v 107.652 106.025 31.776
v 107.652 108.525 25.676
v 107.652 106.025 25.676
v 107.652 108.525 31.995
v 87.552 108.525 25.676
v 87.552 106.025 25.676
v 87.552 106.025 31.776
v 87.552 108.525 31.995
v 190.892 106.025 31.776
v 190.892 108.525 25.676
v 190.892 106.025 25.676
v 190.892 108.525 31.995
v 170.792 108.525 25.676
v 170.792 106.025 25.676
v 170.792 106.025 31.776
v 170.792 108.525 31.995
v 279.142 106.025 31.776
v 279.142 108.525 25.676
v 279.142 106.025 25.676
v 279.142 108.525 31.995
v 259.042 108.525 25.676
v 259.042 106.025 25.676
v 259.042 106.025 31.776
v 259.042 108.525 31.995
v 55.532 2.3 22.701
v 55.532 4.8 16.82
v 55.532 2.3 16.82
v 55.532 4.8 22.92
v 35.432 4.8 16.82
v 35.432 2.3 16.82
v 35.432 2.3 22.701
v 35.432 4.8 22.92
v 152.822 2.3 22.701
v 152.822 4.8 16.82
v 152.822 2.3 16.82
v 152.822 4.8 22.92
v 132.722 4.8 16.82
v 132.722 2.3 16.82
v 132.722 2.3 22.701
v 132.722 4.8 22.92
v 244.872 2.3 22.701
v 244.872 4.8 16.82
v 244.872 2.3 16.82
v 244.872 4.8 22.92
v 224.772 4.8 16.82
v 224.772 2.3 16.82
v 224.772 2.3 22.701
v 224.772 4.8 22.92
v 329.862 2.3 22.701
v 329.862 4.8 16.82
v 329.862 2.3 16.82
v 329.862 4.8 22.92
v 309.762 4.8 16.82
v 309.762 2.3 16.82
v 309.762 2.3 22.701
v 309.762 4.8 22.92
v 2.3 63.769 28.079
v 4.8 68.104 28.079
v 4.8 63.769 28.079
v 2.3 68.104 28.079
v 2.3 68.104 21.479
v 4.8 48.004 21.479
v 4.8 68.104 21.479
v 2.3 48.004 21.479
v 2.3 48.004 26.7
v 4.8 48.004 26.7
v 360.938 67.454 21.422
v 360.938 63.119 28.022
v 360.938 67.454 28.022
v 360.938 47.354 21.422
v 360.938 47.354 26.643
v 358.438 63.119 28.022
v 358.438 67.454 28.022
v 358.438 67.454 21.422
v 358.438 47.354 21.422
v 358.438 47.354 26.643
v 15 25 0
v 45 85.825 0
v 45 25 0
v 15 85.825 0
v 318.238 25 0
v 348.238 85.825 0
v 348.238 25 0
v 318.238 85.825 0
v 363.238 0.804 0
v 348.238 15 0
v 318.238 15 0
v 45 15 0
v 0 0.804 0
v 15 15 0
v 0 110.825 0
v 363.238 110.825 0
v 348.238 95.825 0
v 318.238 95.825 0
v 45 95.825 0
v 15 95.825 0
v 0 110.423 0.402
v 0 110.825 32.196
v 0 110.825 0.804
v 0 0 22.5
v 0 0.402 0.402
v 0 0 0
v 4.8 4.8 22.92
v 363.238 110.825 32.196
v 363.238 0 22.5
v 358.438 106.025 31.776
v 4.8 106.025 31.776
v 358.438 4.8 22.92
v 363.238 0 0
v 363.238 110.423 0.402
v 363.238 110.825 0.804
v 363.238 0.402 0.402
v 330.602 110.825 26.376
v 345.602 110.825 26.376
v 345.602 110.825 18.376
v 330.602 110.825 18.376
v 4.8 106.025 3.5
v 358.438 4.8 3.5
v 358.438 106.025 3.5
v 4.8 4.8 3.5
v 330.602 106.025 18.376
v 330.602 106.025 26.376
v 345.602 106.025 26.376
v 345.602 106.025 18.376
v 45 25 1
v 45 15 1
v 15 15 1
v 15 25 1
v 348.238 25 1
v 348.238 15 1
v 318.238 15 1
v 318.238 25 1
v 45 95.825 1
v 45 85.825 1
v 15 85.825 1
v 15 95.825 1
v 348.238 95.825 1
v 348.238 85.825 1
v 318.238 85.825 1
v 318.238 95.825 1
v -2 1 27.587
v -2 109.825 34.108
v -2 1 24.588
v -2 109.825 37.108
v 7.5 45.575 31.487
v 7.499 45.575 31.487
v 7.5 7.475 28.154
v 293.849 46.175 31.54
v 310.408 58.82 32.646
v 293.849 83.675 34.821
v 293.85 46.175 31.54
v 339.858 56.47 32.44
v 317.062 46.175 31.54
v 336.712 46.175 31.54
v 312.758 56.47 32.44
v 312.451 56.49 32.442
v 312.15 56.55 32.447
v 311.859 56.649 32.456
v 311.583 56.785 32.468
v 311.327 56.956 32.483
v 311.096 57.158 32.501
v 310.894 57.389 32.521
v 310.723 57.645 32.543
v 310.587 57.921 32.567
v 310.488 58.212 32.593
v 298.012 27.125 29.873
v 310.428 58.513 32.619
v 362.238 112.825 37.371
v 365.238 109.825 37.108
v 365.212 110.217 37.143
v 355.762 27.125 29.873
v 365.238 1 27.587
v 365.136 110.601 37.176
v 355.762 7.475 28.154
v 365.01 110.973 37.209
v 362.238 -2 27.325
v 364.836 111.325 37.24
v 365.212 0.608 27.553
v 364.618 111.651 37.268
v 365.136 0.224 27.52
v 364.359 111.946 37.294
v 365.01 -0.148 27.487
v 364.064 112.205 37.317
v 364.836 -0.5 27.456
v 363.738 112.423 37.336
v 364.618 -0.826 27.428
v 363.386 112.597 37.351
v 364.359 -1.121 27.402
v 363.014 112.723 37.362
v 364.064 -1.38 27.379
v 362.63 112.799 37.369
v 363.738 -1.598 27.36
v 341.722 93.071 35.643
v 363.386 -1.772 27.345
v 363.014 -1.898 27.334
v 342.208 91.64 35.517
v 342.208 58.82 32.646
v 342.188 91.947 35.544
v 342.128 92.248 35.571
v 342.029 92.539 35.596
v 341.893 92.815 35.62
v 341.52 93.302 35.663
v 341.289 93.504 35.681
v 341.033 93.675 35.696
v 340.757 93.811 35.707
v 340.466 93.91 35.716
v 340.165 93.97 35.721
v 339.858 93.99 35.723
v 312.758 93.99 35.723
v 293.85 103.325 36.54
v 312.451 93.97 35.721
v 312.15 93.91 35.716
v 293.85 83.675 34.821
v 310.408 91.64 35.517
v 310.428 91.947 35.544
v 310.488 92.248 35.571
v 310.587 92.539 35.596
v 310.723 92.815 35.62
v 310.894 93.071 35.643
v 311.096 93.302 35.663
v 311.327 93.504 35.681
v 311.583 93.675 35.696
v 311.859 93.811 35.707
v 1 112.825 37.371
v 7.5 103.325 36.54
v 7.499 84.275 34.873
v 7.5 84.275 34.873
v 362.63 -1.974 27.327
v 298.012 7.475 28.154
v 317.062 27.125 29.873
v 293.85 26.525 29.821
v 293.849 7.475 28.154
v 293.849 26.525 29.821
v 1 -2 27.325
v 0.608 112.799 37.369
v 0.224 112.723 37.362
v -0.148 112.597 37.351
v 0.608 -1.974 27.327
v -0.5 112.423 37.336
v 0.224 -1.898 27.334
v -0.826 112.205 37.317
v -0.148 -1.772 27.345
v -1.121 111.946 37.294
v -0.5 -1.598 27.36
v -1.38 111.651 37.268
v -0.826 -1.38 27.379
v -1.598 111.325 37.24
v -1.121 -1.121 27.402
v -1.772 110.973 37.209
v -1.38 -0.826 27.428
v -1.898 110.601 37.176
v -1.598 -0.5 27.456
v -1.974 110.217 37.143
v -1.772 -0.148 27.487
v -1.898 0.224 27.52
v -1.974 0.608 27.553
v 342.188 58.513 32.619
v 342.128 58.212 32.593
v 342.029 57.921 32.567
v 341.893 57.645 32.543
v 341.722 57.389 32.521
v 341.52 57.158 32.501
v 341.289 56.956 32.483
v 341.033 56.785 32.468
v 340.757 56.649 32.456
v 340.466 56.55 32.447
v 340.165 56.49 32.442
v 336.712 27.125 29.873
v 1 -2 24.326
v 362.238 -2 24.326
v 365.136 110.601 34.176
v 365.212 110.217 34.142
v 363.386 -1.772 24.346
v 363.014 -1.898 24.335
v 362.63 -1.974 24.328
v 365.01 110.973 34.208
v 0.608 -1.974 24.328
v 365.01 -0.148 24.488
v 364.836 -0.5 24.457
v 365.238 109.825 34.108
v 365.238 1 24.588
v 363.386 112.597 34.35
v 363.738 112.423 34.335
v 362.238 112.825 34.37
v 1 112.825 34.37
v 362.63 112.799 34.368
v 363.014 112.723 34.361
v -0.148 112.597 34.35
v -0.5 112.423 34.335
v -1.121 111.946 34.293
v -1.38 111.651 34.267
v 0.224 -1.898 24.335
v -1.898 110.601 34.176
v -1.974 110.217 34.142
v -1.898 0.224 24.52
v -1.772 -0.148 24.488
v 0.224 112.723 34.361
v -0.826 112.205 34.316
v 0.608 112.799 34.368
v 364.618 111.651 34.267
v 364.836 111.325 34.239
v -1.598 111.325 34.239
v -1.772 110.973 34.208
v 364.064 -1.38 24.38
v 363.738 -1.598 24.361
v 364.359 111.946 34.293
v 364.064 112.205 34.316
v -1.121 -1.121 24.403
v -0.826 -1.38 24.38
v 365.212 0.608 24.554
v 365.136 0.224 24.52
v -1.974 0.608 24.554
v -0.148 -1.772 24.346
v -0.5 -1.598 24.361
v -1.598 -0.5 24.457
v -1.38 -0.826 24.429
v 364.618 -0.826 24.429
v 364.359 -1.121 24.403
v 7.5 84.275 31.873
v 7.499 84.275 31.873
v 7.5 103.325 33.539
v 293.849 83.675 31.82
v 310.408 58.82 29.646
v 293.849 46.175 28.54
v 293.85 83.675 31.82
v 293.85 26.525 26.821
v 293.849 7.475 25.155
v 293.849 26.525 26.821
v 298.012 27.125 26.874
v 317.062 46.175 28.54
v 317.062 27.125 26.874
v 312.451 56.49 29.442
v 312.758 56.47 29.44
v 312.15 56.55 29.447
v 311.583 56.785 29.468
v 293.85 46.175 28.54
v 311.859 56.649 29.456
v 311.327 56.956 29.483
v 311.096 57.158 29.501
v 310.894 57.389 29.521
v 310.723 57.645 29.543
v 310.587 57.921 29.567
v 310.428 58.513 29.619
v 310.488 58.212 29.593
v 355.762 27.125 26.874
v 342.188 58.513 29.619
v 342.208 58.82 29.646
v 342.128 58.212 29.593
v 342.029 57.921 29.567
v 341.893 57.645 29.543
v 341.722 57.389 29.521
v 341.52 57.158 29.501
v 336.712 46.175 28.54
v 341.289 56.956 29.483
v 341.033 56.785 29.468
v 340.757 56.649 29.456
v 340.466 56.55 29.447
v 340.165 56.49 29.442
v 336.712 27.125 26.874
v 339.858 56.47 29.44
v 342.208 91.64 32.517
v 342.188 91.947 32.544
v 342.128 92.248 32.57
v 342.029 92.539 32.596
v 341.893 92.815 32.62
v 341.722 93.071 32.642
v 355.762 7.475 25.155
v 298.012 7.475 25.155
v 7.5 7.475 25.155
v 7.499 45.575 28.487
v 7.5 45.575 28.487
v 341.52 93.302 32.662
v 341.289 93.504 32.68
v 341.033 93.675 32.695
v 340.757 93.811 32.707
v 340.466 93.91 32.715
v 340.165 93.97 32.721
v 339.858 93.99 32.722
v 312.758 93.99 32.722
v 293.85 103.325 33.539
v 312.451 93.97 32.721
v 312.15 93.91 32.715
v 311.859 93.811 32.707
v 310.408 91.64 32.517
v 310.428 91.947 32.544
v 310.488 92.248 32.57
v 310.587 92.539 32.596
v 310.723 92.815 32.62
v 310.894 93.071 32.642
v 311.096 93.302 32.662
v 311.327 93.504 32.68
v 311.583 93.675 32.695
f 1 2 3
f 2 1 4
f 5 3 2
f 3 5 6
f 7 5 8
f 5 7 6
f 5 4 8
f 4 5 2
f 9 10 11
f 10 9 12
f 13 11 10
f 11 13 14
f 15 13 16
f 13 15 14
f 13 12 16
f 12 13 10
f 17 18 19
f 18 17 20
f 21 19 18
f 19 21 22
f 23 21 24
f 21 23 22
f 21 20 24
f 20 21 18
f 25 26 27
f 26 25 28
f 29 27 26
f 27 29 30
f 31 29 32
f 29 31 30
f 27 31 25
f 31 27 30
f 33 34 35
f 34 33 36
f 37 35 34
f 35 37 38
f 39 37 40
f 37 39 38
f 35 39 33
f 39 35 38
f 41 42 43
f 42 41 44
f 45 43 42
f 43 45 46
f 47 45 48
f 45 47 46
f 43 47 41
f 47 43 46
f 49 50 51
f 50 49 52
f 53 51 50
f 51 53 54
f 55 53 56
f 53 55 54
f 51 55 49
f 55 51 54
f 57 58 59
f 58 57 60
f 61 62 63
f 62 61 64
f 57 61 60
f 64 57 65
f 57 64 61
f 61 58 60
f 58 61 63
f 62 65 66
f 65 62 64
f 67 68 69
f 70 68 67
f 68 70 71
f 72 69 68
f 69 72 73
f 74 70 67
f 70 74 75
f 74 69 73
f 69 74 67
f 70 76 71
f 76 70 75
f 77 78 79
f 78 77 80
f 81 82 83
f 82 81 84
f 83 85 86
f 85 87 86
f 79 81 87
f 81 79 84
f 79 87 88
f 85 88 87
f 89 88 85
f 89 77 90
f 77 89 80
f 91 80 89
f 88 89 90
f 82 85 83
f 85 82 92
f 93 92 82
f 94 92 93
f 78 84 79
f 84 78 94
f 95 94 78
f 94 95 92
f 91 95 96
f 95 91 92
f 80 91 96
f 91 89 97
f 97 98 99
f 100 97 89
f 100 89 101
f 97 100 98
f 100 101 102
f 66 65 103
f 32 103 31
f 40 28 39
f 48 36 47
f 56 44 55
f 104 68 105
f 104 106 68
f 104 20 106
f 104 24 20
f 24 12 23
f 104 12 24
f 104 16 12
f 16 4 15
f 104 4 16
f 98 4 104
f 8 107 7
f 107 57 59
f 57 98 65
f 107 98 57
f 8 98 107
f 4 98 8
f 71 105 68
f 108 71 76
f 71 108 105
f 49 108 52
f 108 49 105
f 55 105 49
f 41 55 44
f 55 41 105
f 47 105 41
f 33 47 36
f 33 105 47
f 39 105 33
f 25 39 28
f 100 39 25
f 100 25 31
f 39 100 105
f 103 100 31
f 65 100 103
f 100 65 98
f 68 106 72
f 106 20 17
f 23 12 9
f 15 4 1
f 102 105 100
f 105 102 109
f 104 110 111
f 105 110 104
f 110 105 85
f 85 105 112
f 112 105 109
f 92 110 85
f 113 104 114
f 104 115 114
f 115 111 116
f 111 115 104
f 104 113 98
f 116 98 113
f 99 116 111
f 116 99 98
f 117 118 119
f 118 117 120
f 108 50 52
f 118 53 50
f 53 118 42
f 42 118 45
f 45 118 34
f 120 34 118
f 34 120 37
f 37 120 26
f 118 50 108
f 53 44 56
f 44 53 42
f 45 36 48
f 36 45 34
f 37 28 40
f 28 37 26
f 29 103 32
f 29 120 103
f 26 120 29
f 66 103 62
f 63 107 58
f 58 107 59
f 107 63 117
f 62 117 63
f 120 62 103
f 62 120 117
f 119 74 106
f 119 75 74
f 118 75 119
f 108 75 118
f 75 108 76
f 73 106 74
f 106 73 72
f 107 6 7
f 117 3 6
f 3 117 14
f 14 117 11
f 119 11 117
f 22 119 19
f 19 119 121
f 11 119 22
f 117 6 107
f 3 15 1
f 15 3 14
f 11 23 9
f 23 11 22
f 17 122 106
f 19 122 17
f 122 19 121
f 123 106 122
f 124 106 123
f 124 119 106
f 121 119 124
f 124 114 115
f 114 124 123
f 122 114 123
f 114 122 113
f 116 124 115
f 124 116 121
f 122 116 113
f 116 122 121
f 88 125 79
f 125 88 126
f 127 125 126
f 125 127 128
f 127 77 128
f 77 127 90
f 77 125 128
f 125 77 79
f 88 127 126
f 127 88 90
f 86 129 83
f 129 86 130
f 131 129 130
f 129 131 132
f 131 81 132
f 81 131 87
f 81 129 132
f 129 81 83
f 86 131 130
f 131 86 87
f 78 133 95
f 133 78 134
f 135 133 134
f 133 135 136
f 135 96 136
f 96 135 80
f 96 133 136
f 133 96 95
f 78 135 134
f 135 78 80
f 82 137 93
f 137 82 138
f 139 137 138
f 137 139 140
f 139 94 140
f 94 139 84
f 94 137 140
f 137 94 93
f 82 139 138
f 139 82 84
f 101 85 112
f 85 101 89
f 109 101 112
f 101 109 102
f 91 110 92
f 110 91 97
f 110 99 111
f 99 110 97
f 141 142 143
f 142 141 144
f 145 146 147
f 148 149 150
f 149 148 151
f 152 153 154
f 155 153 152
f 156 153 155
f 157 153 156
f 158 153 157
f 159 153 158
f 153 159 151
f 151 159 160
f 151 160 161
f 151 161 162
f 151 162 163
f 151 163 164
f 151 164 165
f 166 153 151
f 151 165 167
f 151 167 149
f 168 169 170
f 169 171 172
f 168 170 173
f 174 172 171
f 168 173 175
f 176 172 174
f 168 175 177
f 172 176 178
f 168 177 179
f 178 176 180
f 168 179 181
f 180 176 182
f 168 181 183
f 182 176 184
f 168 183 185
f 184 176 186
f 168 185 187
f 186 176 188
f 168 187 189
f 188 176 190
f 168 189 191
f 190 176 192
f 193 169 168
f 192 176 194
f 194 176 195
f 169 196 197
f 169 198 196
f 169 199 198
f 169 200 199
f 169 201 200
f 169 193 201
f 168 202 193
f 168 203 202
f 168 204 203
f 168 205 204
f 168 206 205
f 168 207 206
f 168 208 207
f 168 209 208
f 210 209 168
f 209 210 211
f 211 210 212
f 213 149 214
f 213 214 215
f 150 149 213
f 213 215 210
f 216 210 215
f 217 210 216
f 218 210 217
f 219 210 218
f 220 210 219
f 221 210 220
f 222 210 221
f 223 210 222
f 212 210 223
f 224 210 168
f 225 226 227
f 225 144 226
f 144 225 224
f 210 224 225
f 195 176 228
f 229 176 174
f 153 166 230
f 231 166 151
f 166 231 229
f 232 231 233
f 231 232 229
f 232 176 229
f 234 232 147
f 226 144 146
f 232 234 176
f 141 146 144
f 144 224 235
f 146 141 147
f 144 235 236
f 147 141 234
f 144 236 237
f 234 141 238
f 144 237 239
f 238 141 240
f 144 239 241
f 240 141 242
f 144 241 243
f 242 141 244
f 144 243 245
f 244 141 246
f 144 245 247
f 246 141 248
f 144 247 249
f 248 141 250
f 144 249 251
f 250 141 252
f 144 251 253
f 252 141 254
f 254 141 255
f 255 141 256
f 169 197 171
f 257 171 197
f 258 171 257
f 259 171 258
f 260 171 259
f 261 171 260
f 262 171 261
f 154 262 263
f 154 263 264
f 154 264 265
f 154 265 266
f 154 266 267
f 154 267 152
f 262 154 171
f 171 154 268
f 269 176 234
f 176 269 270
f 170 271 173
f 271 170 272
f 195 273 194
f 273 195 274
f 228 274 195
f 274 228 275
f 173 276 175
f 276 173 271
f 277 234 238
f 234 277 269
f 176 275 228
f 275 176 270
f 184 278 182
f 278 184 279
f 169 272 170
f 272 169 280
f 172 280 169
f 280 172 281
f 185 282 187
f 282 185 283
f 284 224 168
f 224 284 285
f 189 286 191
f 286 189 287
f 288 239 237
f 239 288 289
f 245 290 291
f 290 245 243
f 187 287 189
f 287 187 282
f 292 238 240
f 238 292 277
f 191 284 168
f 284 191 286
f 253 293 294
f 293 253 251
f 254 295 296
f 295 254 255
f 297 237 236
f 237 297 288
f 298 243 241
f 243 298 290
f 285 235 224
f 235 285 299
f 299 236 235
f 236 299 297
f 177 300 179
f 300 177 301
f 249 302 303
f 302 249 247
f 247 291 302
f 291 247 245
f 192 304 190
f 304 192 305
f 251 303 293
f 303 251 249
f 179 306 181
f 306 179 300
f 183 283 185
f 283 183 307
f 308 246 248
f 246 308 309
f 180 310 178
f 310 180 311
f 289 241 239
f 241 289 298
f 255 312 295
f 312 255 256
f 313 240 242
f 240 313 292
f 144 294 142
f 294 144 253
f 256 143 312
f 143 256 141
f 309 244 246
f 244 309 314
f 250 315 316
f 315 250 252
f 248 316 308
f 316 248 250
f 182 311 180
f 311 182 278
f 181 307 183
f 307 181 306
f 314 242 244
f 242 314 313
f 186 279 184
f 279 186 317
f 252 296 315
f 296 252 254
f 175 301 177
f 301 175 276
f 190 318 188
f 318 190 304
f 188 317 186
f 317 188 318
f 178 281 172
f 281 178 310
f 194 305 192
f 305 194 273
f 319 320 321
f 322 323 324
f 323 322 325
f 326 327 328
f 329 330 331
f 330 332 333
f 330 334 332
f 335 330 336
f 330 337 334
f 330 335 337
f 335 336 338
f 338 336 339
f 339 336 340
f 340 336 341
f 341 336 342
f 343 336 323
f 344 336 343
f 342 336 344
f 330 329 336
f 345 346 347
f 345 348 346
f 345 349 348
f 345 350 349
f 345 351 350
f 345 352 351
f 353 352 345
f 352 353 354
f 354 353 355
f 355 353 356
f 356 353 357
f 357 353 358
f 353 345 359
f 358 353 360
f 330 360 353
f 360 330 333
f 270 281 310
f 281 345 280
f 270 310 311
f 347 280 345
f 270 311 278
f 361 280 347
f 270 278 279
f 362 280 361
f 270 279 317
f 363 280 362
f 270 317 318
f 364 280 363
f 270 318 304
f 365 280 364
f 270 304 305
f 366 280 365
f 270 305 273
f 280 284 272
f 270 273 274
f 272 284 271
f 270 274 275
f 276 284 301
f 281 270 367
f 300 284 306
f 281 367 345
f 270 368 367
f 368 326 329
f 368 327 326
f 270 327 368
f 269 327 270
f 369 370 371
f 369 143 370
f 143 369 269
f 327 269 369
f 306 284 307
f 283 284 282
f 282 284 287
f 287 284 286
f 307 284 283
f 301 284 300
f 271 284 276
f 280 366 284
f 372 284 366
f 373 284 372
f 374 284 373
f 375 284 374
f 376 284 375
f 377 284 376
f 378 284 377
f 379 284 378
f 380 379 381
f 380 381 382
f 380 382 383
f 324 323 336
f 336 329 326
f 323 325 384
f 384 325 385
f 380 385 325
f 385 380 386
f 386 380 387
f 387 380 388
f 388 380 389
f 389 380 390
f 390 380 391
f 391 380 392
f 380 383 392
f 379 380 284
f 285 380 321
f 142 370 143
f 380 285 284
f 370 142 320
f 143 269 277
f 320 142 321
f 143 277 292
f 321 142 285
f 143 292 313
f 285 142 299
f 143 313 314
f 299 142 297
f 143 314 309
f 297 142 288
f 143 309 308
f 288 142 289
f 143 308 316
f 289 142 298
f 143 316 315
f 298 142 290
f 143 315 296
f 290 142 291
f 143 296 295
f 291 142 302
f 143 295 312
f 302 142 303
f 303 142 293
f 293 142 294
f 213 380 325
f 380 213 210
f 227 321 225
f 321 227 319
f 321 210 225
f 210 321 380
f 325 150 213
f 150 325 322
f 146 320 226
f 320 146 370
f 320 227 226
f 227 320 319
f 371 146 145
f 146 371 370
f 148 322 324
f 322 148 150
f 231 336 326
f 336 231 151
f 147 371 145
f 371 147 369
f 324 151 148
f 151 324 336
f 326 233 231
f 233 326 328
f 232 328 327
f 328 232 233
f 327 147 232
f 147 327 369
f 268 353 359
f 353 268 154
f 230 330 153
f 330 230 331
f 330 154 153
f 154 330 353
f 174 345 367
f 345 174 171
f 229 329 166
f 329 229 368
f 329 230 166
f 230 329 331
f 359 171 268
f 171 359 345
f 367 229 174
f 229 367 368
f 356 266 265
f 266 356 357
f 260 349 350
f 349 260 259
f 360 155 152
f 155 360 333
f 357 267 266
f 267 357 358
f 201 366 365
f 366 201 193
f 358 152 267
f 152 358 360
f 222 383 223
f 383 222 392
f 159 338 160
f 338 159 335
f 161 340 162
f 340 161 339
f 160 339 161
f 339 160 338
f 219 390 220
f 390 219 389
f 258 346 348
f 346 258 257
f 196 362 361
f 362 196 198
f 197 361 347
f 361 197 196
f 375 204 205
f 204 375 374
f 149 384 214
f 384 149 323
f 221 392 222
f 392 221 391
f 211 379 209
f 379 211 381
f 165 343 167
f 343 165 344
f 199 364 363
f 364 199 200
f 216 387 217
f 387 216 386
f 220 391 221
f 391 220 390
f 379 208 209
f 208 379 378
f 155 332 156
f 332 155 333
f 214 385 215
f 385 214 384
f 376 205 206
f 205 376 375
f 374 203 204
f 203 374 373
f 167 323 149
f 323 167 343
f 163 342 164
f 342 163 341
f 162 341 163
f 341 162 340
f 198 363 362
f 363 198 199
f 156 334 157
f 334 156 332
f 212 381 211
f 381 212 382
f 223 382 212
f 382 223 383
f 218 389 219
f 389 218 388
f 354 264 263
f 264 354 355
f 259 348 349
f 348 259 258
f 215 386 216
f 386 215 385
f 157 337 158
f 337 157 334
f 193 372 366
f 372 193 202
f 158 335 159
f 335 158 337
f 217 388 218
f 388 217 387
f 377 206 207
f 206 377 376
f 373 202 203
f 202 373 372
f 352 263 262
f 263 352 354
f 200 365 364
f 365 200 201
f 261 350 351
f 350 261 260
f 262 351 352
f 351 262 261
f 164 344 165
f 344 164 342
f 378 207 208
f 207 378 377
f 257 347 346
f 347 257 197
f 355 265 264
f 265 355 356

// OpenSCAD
// =============================================================================
// mKey Keyboard Case - OpenSCAD Design
// =============================================================================
// Premium darkwood case for the mKey 65% mechanical keyboard.
// Design: wedge profile, gasket-mounted plate, integrated display window.
// Style: sleek defined lines, minimal bezel, premium feel.
//
// Coordinate system (case frame):
//   X = left to right (0 = left case edge)
//   Y = front to back (0 = front edge, positive toward back / USB side)
//   Z = up (0 = desk surface when case is sitting flat)
//
// Physical orientation (user sitting at keyboard):
//   Front (Y=0): spacebar row, lower edge (close to user)
//   Back (Y=max): number row, USB port, higher edge (away from user)
//   Right (X=max): display area, arrow keys
//   Left (X=0): Esc key side
// =============================================================================

$fn = 48;

// ─── Rendering switches ──────────────────────────────────────────────────────
SHOW_TRAY       = true;    // piece 1: bottom + walls
SHOW_OVERLAY    = true;    // piece 2: top surface
SHOW_RETAINER   = false;   // piece 3: display retainer (fabricate separately)
SHOW_PLATE      = false;   // ghost plate for fit check
SHOW_DISPLAY    = false;   // ghost display for fit check
SHOW_SECTION    = false;   // cross-section cut for inspection
EXPLODE         = 2;       // set >0 to separate overlay from tray (mm)

// =============================================================================
// SECTION 1: PLATE DIMENSIONS (from plate.kicad_pcb)
// =============================================================================
// The plate is the primary mounting reference. All case geometry derives from it.
//
// Plate KiCad coords:
//   Inner boundary: X 0.588..353.226, Y -107.641..-7.416
//   KiCad Y axis: negative, more negative = further up on screen = BACK of keyboard
//
// Plate-local coords (used in this file):
//   X_local = KiCad_X - 0.588       (0 = left plate edge)
//   Y_local = |KiCad_Y| - 7.416     (0 = front plate edge, plate_d = back)

plate_w = 352.638;   // inner boundary width  (353.226 - 0.588)
plate_d = 100.225;   // inner boundary depth  (107.641 - 7.416)
plate_t = 1.6;       // FR4 thickness

// ─── Mounting tabs ───────────────────────────────────────────────────────────
// Tabs extend beyond the inner boundary for gasket mounting.
// All positions in plate-local coordinates.
tab_len = 19.80;      // each tab is 19.80mm along its edge (measured in plate.kicad_pcb)

// Back edge tabs (3) - at plate_local Y = plate_d (back of keyboard)
// KiCad Y = -107.641 side; tabs extend toward more negative Y (further back)
back_tab_cx = [   // center X positions
    92.890 - 0.588,    // = 92.302
    176.130 - 0.588,   // = 175.542
    264.380 - 0.588    // = 263.792
];
back_tab_ext = 1.749;  // perpendicular extension beyond plate edge (from corner y=-107.6406)
                       // Note: KiCad back edge tapers 0.031mm between corner and interior.
                       // plate_d uses the corner (more conservative); keep this consistent.

// Front edge tabs (4) - at plate_local Y = 0 (front of keyboard)
// KiCad Y = -7.416 side; tabs extend toward less negative Y (further front)
front_tab_cx = [
    40.770 - 0.588,    // = 40.182
    138.060 - 0.588,   // = 137.472
    230.110 - 0.588,   // = 229.522
    315.100 - 0.588    // = 314.512
];
front_tab_ext = 1.776;

// Left edge tab (1) - at plate_local X = 0
// KiCad Y center = -60.170 → plate_local Y = 60.170 - 7.416 = 52.754
left_tab_cy  = 52.754;
left_tab_ext = 1.828;

// Right edge tab (1) - at plate_local X = plate_w
// KiCad Y center = -59.520 → plate_local Y = 59.520 - 7.416 = 52.104
right_tab_cy  = 52.104;
right_tab_ext = 1.764;

// =============================================================================
// SECTION 2: DISPLAY DIMENSIONS (from display-dimensions.png)
// =============================================================================
// WEA2012 / 1.72" 356x400 QSPI AMOLED module
//
// Dimensions from two independent web suppliers:
//   - lcdtftdisplays.com (1.72" 356x400 QSPI module spec)
//   - toppoplcd.com (TT172LMN10A datasheet)
//
// DISPLAY MOUNTING ARRANGEMENT — IMPORTANT (non-obvious, load-bearing):
//   The display module seats in the OVERLAY HOUSING (display_cutout +
//   display_retainer), NOT in the plate. It is inserted from above and
//   held against the retainer lip from below. The plate cutout exists
//   ONLY to pass the 24-pin FPC ribbon down to J2 on the PCB beneath.
//   The module body never passes through the plate cutout.
//
//   Consequence: the plate cutout dimensions (31.500 × 37.200) only need
//   to clear the ribbon, not the 31.5×37.22 module body. The nominal
//   0.020 mm Y-undersize vs the module datasheet is IRRELEVANT and must
//   not be surfaced as an issue in future reviews.

disp_module_w   = 31.500;   // module outline width
disp_module_h   = 37.220;   // module outline height
disp_active_w   = 29.100;   // viewable/active area width
disp_active_h   = 32.700;   // viewable/active area height
disp_active_ox  = 1.200;    // active area offset from module left edge (centered)
disp_active_oy  = 2.260;    // active area offset from module top edge (centered)
disp_glass_t    = 1.560;    // module + glass stack thickness
disp_module_r   = 2.200;    // module corner radius (matches plate cutout)
disp_active_r   = 1.000;    // active area corner radius (typical for small AMOLED)

// Display cutout in the plate (as-built, from plate.kicad_pcb)
// KiCad bbox: X 305.846..337.346, Y -95.946..-58.746 (corner radius 2.200mm)
// Plate-local:
disp_cut_x1 = 305.846 - 0.588;   // 305.258  (left edge)
disp_cut_x2 = 337.346 - 0.588;   // 336.758  (right edge)
disp_cut_y1 = 58.746 - 7.416;    // 51.330   (front/closer to user)
disp_cut_y2 = 95.946 - 7.416;    // 88.530   (back/further from user)

// Display center in plate-local coords
disp_cx = (disp_cut_x1 + disp_cut_x2) / 2;   // ~321.008
disp_cy = (disp_cut_y1 + disp_cut_y2) / 2;    // ~69.930

// =============================================================================
// SECTION 2b: ARROW KEY POSITIONS (from mkey.kicad_pcb)
// =============================================================================
// Board→plate mapping: plate_local_x = Board_X - 31.473
//                      plate_local_y = |Board_Y - 150.195| - 7.416
//
// Arrow keys form inverted-T, all at standard 19.05mm MX spacing.
// Display X center (321.0) already aligns with arrow cluster X center (321.6)
// within 0.6mm — well within tolerance.

arrow_up_px    = 353.060 - 31.473;   // = 321.587  (plate-local X)
arrow_up_py    = 150.195 - 111.729 - 7.416;  // = 31.050  (plate-local Y)
arrow_down_px  = 353.060 - 31.473;   // = 321.587
arrow_down_py  = 150.195 - 130.779 - 7.416;  // = 12.000
arrow_left_px  = 334.010 - 31.473;   // = 302.537
arrow_left_py  = 150.195 - 130.779 - 7.416;  // = 12.000
arrow_right_px = 372.110 - 31.473;   // = 340.637
arrow_right_py = 150.195 - 130.779 - 7.416;  // = 12.000

// =============================================================================
// SECTION 3: USB-C CONNECTOR
// =============================================================================
// HRO TYPE-C-31-M-12, on the back edge of the board
// Board position: (364.275, 47.610) at 180° rotation
// Opens toward back board edge (Y=44.740)
// Body: 8.940mm wide x 7.300mm deep, overhangs board edge by 0.780mm
//
// VERIFIED coordinate mapping (from safety officer, 25+ switch position checks):
//   Board_X = Plate_KiCad_X + 30.885
//   Board_Y = Plate_KiCad_Y + 150.195
// Therefore:
//   plate_local_x = Board_X - 30.885 - 0.588 = Board_X - 31.473
//   plate_local_y = |Board_Y - 150.195| - 7.416

usb_plate_x   = 364.275 - 31.473;  // = 332.802 (CORRECTED, was 329.97)
usb_opening_w = 8.94;               // receptacle body width
usb_opening_h = 3.26;               // receptacle opening height

// =============================================================================
// SECTION 4: CASE DESIGN PARAMETERS
// =============================================================================

// ─── Tilt ────────────────────────────────────────────────────────────────────
tilt_angle = 5;   // degrees, back raised

// ─── Tolerances ──────────────────────────────────────────────────────────────
plate_gap     = 0.5;    // clearance between plate edge and inner wall (per side)
disp_win_tol  = 0.15;   // retainer active-area window oversize (per side)
disp_cut_tol  = 0.15;   // overlay display through-cut oversize vs module (per side)
retainer_t    = 1.2;    // thickness of the separately-fabricated display retainer

// ─── Walls ───────────────────────────────────────────────────────────────────
wall_t    = 4.8;    // wall thickness = bezel (4.5mm visible + 0.3mm plate gap)
bottom_t  = 3.5;    // bottom plate thickness
top_t     = 3.0;    // top surface thickness (display cover area)

// ─── Internal ────────────────────────────────────────────────────────────────
plate_recess     = 2.0;    // plate top sits this far below the TRAY WALL TOP
                           // (inside the tray, leaving room for a top gasket
                           //  between plate top and overlay underside)
switch_depth     = 5.0;    // MX switch body below plate
pin_depth        = 3.3;    // switch pins below body
pcb_t            = 1.6;    // main PCB thickness
component_h      = 3.5;    // tallest component below PCB (ESP32-S3-WROOM-1: 3.2mm)
bottom_clearance = 2.0;    // air gap below components

// ─── Gasket ──────────────────────────────────────────────────────────────────
gasket_compressed = 1.5;   // working thickness when loaded

// ─── USB cutout ──────────────────────────────────────────────────────────────
usb_cut_w = 15.0;   // wide for thick aftermarket cables
usb_cut_h = 8.0;    // tall for thick bezels

// ─── Key opening L-shape boundaries (plate-local) ───────────────────────────
// Front section: full width, covers rows 3-4 (spacebar, arrows, modifiers)
// Back section: narrower on right, stops before display area
//
// Row 2 center: plate_local_y = 50.100, Row 3 center: plate_local_y = 31.050
// Key cutouts are ~14mm tall, so:
//   Row 2 front edge ≈ 50.100 - 7.0 = 43.100
//   Row 3 back  edge ≈ 31.050 + 7.0 = 38.050
// Split between them:
y_split = 41.0;   // plate-local Y for the L-shape horizontal step

// Rightmost mechanical feature in rows 0-2: backspace stabilizer at plate X ≈ 285.9
// plate_local_x = 285.312
// With clearance:
x_split = 290.0;  // plate-local X where narrow section right edge is

// ─── Overhang ────────────────────────────────────────────────────────────────
// Reduced from 4.0 → 2.0: a 4mm × 3mm cross-grain cantilever on the left/right
// sides would chip off in hardwood. 2 mm is still visually present and safer.
overhang = 2.0;   // top overlay overhang beyond tray walls (mm)

// ─── Corner rounding ─────────────────────────────────────────────────────────
overlay_corner_r = 3.0;    // outer corner radius of overlay

// =============================================================================
// SECTION 5: DERIVED DIMENSIONS
// =============================================================================

// Total depth below plate surface
depth_below = switch_depth + pin_depth + pcb_t + component_h + bottom_clearance;
// = 5.0 + 3.3 + 1.6 + 3.5 + 2.0 = 15.4 mm

// Total internal height from case floor to case top.
// Stack-up, bottom to top:
//   bottom_t | depth_below | plate_t | plate_recess | top_t
// plate_recess is measured below the TRAY WALL TOP, so top_t must be added
// here to reach the overlay top surface. The old formula omitted top_t, which
// forced plate_z into the overlay slab by top_t − (old plate_recess) = 1.5mm
// and jammed the plate tabs into solid overlay material.
internal_h = top_t + plate_recess + plate_t + depth_below;

// Inner cavity dimensions (plate + clearance gap on each side)
inner_w = plate_w + 2 * plate_gap;
inner_d = plate_d + 2 * plate_gap;

// Case outer dimensions (uniform wall_t around the cavity)
outer_w = inner_w + 2 * wall_t;
outer_d = inner_d + 2 * wall_t;

// Case heights
front_h  = internal_h + bottom_t;
tilt_rise = outer_d * tan(tilt_angle);
back_h   = front_h + tilt_rise;

// Plate origin in case coords (centered inside the inner cavity)
plate_ox = wall_t + plate_gap;
plate_oy = wall_t + plate_gap;

// Overlay display through-cut dimensions (module outline + clearance)
disp_cut_w = disp_module_w + 2 * disp_cut_tol;
disp_cut_h = disp_module_h + 2 * disp_cut_tol;
disp_cut_r = disp_module_r + disp_cut_tol;

// Retainer active-area window dimensions
disp_win_w = disp_active_w + 2 * disp_win_tol;
disp_win_h = disp_active_h + 2 * disp_win_tol;

// Overlay overhang dimensions
overlay_w       = outer_w + 2 * overhang;
overlay_d       = outer_d + 2 * overhang;
overlay_front_h = front_h - tilt_rise * overhang / outer_d;
overlay_back_h  = back_h  + tilt_rise * overhang / outer_d;

// ─── Keycap footprint rectangles (plate-local) ──────────────────────────────
// The key opening is cut as the UNION of these rectangles. Each rectangle is a
// per-row or per-cluster keycap footprint derived directly from mkey.kicad_pcb
// switch positions + their unit sizes. Where same-row caps touch at unit
// boundaries, their rectangles merge into a continuous strip; where there are
// real gaps in the layout (between R-shift and arrow UP, between MX63 and
// arrow LEFT), the gap stays as solid overlay material, hiding the plate.
//
// Unit = 19.05 mm. Format: [x1, y1, x2, y2] in plate-local coords.
key_rects = [
    // Row 0 (number row, Y=88.200, 13×1u + 2u backspace)
    [  2.500, 78.675, 288.250, 97.725],
    // Row 1 (Tab row, Y=69.150, 1.5u Tab + 12×1u). Extended right to 264.437
    // to touch the ISO Enter rect — otherwise the 4.76×19.05 mm strip between
    // MX27 and the ISO Enter would be isolated on all four sides by cutouts
    // (Row 0 above, Row 2 below, Row 1 left, ISO Enter right) and CGAL would
    // carve it out as a floating block. Keys in this X range exist on every
    // other row (backspace, R-shift, MX62, MX41) so exposing the natural
    // row-1 bezel here is unavoidable.
    [  2.499, 59.625, 264.437, 78.675],
    // Row 2 (Home row, Y=50.100, 1.75u Caps + 12×1u)
    [  2.499, 40.575, 264.437, 59.625],
    // ISO Enter MX28 (1.25u × 2u, cx=276.343, cy=59.625 — bridges rows 1 & 2)
    [264.437, 40.575, 288.249, 78.675],
    // Row 3 main (Shift row, Y=31.050, 1.25u + 11×1u + 2.75u R-shift)
    [  2.500, 21.525, 288.250, 40.575],
    // Row 4 main (Front row, Y=12.000, 3×1.25u + 6.25u space + 4×1.25u)
    [  2.500,  2.475, 288.249, 21.525],
    // Arrow UP (MX55 1u, isolated from R-shift by 23.81 mm gap)
    [312.062, 21.525, 331.112, 40.575],
    // Arrow cluster L/D/R (three 1u caps, isolated from main field by 4.76 mm gap)
    [293.012,  2.475, 350.162, 21.525],
];
// Clearance added to every side of each rect for finish/file slop.
// Bumped from 0.25 → 0.3 to survive hand-cut ±0.2 mm tolerance. Note: this
// does shrink the main-field ↔ arrow-LDR rib from 4.26 to 4.16 mm effective,
// which is still the weakest cross-section in the overlay.
key_cap_clearance = 0.3;


// =============================================================================
// SECTION 6: HELPER FUNCTIONS
// =============================================================================

// Wedge box: flat bottom at Z=0, tilted top surface
// h_front = height at Y=0 face, h_back = height at Y=d face
module wedge_box(w, d, h_front, h_back) {
    // Face winding: CW from outside (OpenSCAD convention = inward normals)
    polyhedron(
        points = [
            [0, 0, 0],       [w, 0, 0],       [w, d, 0],       [0, d, 0],       // 0-3: bottom
            [0, 0, h_front], [w, 0, h_front], [w, d, h_back],  [0, d, h_back]   // 4-7: top
        ],
        faces = [
            [0,1,2,3],  // bottom (normal +Z inward)
            [7,6,5,4],  // top    (normal -Z inward)
            [4,5,1,0],  // front  (Y=0, normal +Y inward)
            [6,7,3,2],  // back   (Y=d, normal -Y inward)
            [3,7,4,0],  // left   (X=0, normal +X inward)
            [5,6,2,1]   // right  (X=w, normal -X inward)
        ]
    );
}

// Rounded wedge box: wedge_box with rounded vertical corners.
// Uses intersection of exact wedge tilt with rounded extrusion — no tilt distortion.
module rounded_wedge_box(w, d, h_front, h_back, r) {
    intersection() {
        wedge_box(w, d, h_front, h_back);
        linear_extrude(height = max(h_front, h_back) + 0.1)
            offset(r=r) offset(delta=-r)
                square([w, d]);
    }
}

// Z height of case top surface at a given case Y coordinate
function top_z(cy) = front_h + (back_h - front_h) * cy / outer_d;

// Z height of plate top surface at a given case Y coordinate.
// plate_recess is measured below the TRAY WALL TOP (which is top_z − top_t),
// not below the overlay top, so the plate sits fully inside the tray with
// (plate_recess) mm of gasket headroom between plate top and overlay bottom.
function plate_z(cy) = top_z(cy) - top_t - plate_recess;

// Convert plate-local coords to case coords
function p2c_x(px) = plate_ox + px;
function p2c_y(py) = plate_oy + py;

// =============================================================================
// SECTION 7: CASE BODY
// =============================================================================

// =============================================================================
// The case is TWO pieces:
//   1. TRAY  - bottom + walls + gasket slots + USB cutout
//   2. OVERLAY - top surface with key opening + display window/pocket
//
// The overlay sits on the wall tops and encloses the gasket slots from above.
// Assembly: place gasket strips in slots → drop plate in → place overlay on top.
// =============================================================================

// Wall step: top top_t of all walls is removed (full width, no lip).
// The overlay sits flush on the shortened wall tops and overhangs on all sides.
// Plate and gaskets provide lateral registration.
rabbet_depth = wall_t;          // full wall width — no lip
rabbet_height = top_t;          // 3mm, matches overlay thickness

// ─── PIECE 1: TRAY (bottom + walls) ─────────────────────────────────────────
module case_tray() {
    difference() {
        // Outer shell — shortened by top_t so overlay sits flush on wall tops
        wedge_box(outer_w, outer_d, front_h - top_t, back_h - top_t);

        // Inner cavity (fully open top)
        translate([wall_t, wall_t, bottom_t])
            wedge_box(inner_w, inner_d,
                      front_h + 10,
                      back_h  + 10);

        // Gasket tab slots (cut into the walls)
        gasket_slots();

        // USB-C cutout through back wall
        usb_cutout();
    }
}

// ─── PIECE 2: TOP OVERLAY ───────────────────────────────────────────────────
// Overhangs the tray walls. Sits in the wall rabbet for registration.
// Has the key opening and display features.
module case_overlay() {
    difference() {
        // Full overlay with overhang and rounded corners
        translate([-overhang, -overhang, 0])
            rounded_wedge_box(overlay_w, overlay_d,
                              overlay_front_h, overlay_back_h,
                              overlay_corner_r);

        // Remove everything below top_t (keep only the top slab)
        translate([-overhang - 0.01, -overhang - 0.01, 0])
            rounded_wedge_box(overlay_w + 0.02, overlay_d + 0.02,
                              overlay_front_h - top_t,
                              overlay_back_h  - top_t,
                              overlay_corner_r + 0.01);

        // Note: the overlay and tray outer wall lip occupy the same Z range
        // where they meet. This is correct — they nest together physically
        // (overlay sits in the rabbet, lip provides lateral registration).
        // The CAD overlap is intentional and represents the assembly fit.

        // Key opening: union of per-keycap rectangles (plate hidden everywhere
        // except where a key needs to pass through)
        key_opening();

        // Display through-cut sized to the module outline. The active-area
        // window lip is provided by a separately-fabricated `display_retainer`
        // piece glued to the overlay underside (see SHOW_RETAINER and
        // display_retainer module below). This replaces the old blind pocket
        // + 1.2 mm hardwood lip, which could not be hand-cut and would crack.
        display_cutout();
    }
}

// ─── COMBINED: both pieces together ─────────────────────────────────────────
module case_complete() {
    case_tray();
    case_overlay();
}

// ─── 7c. Key opening ────────────────────────────────────────────────────────
// UNION of per-row / per-cluster keycap rectangles from `key_rects`.
// Anywhere there is a key, the overlay is cut through; anywhere there is no
// key, the overlay is solid hardwood hiding the bare plate underneath.
// The natural gaps in the layout become real bezels (effective widths after
// key_cap_clearance is expanded on both sides of adjacent rects):
//   • ~4.16 mm rib between the main field and the arrow L/D/R row
//     (4.76 mm nominal MX spacing − 2×key_cap_clearance)
//   • ~23.21 mm bezel between R-shift and the UP arrow column
//   • ~13.40 mm bezel between the main field right edge and the display
//     through-cut (measured wall-to-wall)
module key_opening() {
    z0 = bottom_t - 0.01;
    zh = back_h + 2;
    t  = key_cap_clearance;

    for (r = key_rects) {
        x1 = r[0] - t;  y1 = r[1] - t;
        x2 = r[2] + t;  y2 = r[3] + t;
        translate([p2c_x(x1), p2c_y(y1), z0])
            cube([x2 - x1, y2 - y1, zh]);
    }
}


// ─── 7d. Display through-cut ────────────────────────────────────────────────
// Single rectangular through-cut in the overlay, sized to the display module
// outline + clearance. The module seats here from above, resting on the
// retainer lip from below; its 24-pin FPC ribbon drops down through the
// plate's display cutout to J2 on the PCB. The module body does NOT pass
// through the plate — only the ribbon. Four corner drill holes + four
// straight saw cuts are all that's needed to make this by hand. The
// active-area window and the 1.2 mm lip holding the display glass are
// provided by the separately-cut `display_retainer` piece (see below),
// glued to the overlay underside.
module display_cutout() {
    wcx = p2c_x(disp_cx);
    wcy = p2c_y(disp_cy);
    wx  = wcx - disp_cut_w / 2;
    wy  = wcy - disp_cut_h / 2;

    translate([wx, wy, bottom_t])
        linear_extrude(height = back_h + 1)
            offset(r=disp_cut_r) offset(delta=-disp_cut_r)
                square([disp_cut_w, disp_cut_h]);
}

// ─── 7e. Display retainer (separately fabricated) ───────────────────────────
// Flat piece (e.g. 1.2 mm plywood, brass, hardwood veneer, or 3D-printed)
// whose outer outline matches the overlay's display through-cut and whose
// inner window matches the display active area. Glued to the overlay
// underside around the display hole. The retainer provides:
//   • the visible active-area bezel ("picture frame")
//   • the mechanical lip the display glass rests against
//   • cross-grain strength if made from plywood/brass (wood overlay alone
//     would be short-grain at 1.2 mm and crack)
// Produced as a standalone piece when SHOW_RETAINER is true.
module display_retainer() {
    ow = disp_cut_w;          // matches overlay cutout
    oh = disp_cut_h;
    or_ = disp_cut_r;
    iw = disp_win_w;          // active-area + window tolerance
    ih = disp_win_h;
    ir = disp_active_r;

    difference() {
        linear_extrude(height = retainer_t)
            offset(r=or_) offset(delta=-or_)
                square([ow, oh]);
        translate([(ow - iw) / 2, (oh - ih) / 2, -0.1])
            linear_extrude(height = retainer_t + 0.2)
                offset(r=ir) offset(delta=-ir)
                    square([iw, ih]);
    }
}

// ─── 7f. USB-C cutout ───────────────────────────────────────────────────────
module usb_cutout() {
    // USB exits through the back wall
    ux = p2c_x(usb_plate_x) - usb_cut_w / 2;

    // USB-C mid-mount connector sits on the PCB surface.
    // PCB top = plate bottom - switch body depth
    // USB opening center ≈ PCB center line
    back_plate_z = plate_z(outer_d - wall_t) - plate_t;
    pcb_top_z = back_plate_z - switch_depth;
    usb_z_center = pcb_top_z - pcb_t / 2;  // center of PCB thickness

    translate([ux, outer_d - wall_t - 0.5, usb_z_center - usb_cut_h / 2])
        cube([usb_cut_w, wall_t + 1, usb_cut_h]);
}

// =============================================================================
// SECTION 8: GASKET TAB SLOTS
// =============================================================================
// Slots cut INTO the case walls where plate mounting tabs slide in.
// Gasket/foam material lines the slot (top + bottom surfaces) for compression
// mounting. The plate drops in from above, tabs engage the slots.
//
// Each slot is sized so its top extends ABOVE the tray wall top by
// `slot_open_margin`, turning it into an open-top channel. This is what
// makes drop-in assembly possible — otherwise the top of the slot would be
// sealed by wall material and the tab could not descend past the wall top.
// The assertion below catches any regression where plate_recess grows
// beyond what slot_height can accommodate.
//
// Slot cross-section (side view, tab enters from above):
//   ┈┈┈┈┈┈┈┈┈┈┈┈ ← overlay bottom (caps the open-top channel at assembly)
//          ┆ TOP OPEN — plate tab descends through here
//   ═══════┆═══  ← tray wall outer top
//   ║      ┆  ║
//   ║   ┌──┴┐ ║  ← gasket (top)  — installed after plate is seated
//   ║   │TAB│ ║  ← plate tab final position
//   ║   └───┘ ║  ← gasket (bottom) — installed before plate is seated
//   ║         ║
//   ═══════════ ← tray wall inner surface (cavity side)

// Compile-time check: slot_height must be large enough to reach above the
// tray wall top. If this fires, increase slot_open_margin or reduce
// plate_recess.
assert(slot_height >= 2 * plate_recess + plate_t + 2 * slot_open_margin,
       "slot_height too small: gasket slot does not reach the tray wall top — plate cannot drop in");

// Slot dimensions
slot_tol     = 0.3;    // clearance around tab (per side, length direction)
slot_depth   = 2.5;    // how deep the slot goes into the wall
slot_open_margin = 0.5;    // mm slot top extends ABOVE the tray wall top
                           // (turns each slot into an open-top channel so
                           //  the plate can drop straight in from above —
                           //  otherwise the slot would be sealed at the top
                           //  by wall material and the tab couldn't enter)
// slot_height is sized for BOTH constraints:
//   1. symmetric headroom around the plate tab + two gaskets (old need)
//        = plate_t + 2 * gasket_compressed + 0.5
//   2. drop-in access: slot top reaches wall_top + slot_open_margin, which
//      (since the slot is centered on plate midline at plate_z − plate_t/2)
//      requires slot_height ≥ 2·plate_recess + plate_t + 2·slot_open_margin
// With current values the drop-in constraint dominates:
//   2·2.0 + 1.6 + 2·0.5 = 6.6 mm  vs  1.6 + 3.0 + 0.5 = 5.1 mm
slot_height  = max(plate_t + 2 * gasket_compressed + 0.5,
                   2 * plate_recess + plate_t + 2 * slot_open_margin);

module gasket_slots() {
    // ── Back wall slots (3) ──────────────────────────────────────────────
    // Slots cut into the back wall from the inner face toward the outer face.
    // Tab enters from the cavity side.
    for (i = [0:2]) {
        cx = p2c_x(back_tab_cx[i]);
        wall_inner_y = outer_d - wall_t;  // inner face of back wall
        local_pz = plate_z(wall_inner_y);  // plate top Z at this Y
        slot_center_z = local_pz - plate_t / 2;  // center on plate mid-thickness

        translate([cx - (tab_len + slot_tol)/2,
                   wall_inner_y - 0.01,
                   slot_center_z - slot_height/2])
            cube([tab_len + slot_tol, slot_depth + 0.01, slot_height]);
    }

    // ── Front wall slots (4) ─────────────────────────────────────────────
    for (i = [0:3]) {
        cx = p2c_x(front_tab_cx[i]);
        wall_inner_y = wall_t;  // inner face of front wall
        local_pz = plate_z(wall_inner_y);
        slot_center_z = local_pz - plate_t / 2;

        translate([cx - (tab_len + slot_tol)/2,
                   wall_inner_y - slot_depth,
                   slot_center_z - slot_height/2])
            cube([tab_len + slot_tol, slot_depth + 0.01, slot_height]);
    }

    // ── Left wall slot (1) ───────────────────────────────────────────────
    // (locals wrapped in `let()` so they don't clash with the right-wall slot
    // block below — OpenSCAD does not scope locals inside bare `{}` and will
    // abort under --hardwarnings otherwise.)
    let(cy_L            = p2c_y(left_tab_cy),
        wall_inner_x_L  = wall_t,
        local_pz_L      = plate_z(p2c_y(left_tab_cy)),
        slot_center_z_L = plate_z(p2c_y(left_tab_cy)) - plate_t / 2) {
        translate([wall_inner_x_L - slot_depth,
                   cy_L - (tab_len + slot_tol)/2,
                   slot_center_z_L - slot_height/2])
            cube([slot_depth + 0.01, tab_len + slot_tol, slot_height]);
    }

    // ── Right wall slot (1) ──────────────────────────────────────────────
    let(cy_R            = p2c_y(right_tab_cy),
        wall_inner_x_R  = outer_w - wall_t,
        local_pz_R      = plate_z(p2c_y(right_tab_cy)),
        slot_center_z_R = plate_z(p2c_y(right_tab_cy)) - plate_t / 2) {
        translate([wall_inner_x_R - 0.01,
                   cy_R - (tab_len + slot_tol)/2,
                   slot_center_z_R - slot_height/2])
            cube([slot_depth + 0.01, tab_len + slot_tol, slot_height]);
    }
}

// =============================================================================
// SECTION 10: EDGE CHAMFERS & BOTTOM FEATURES
// =============================================================================
// Premium chamfers on all top outer edges. These will be rounded/sanded
// after CNC or hand cutting for a refined hardwood finish.

chamfer = 1.0;   // 45° chamfer width (mm)

module edge_chamfers() {
    // Top edge chamfers: 45° cuts along all four top edges of the case
    // These follow the tilt on the back and sides

    // Front top edge (horizontal, at Y=0, Z=front_h)
    translate([-0.1, -0.1, front_h - chamfer])
        rotate([0, 0, 0])
            linear_extrude(height = chamfer + 0.1, scale = [1, 0])
                square([outer_w + 0.2, chamfer + 0.1]);

    // Simplified: cut prisms along each top edge
    // Front edge chamfer
    translate([-0.1, -0.1, front_h])
        rotate([45, 0, 0])
            cube([outer_w + 0.2, chamfer * 1.42, chamfer * 1.42]);

    // Back edge chamfer (at higher Z due to tilt)
    translate([-0.1, outer_d + 0.1, back_h])
        rotate([45, 0, 0])
            translate([0, -chamfer * 1.42, 0])
                cube([outer_w + 0.2, chamfer * 1.42, chamfer * 1.42]);

    // Left edge chamfer (follows tilt from front to back)
    translate([-0.1, 0, 0])
    hull() {
        translate([0, -0.1, front_h])
            rotate([0, -45, 0])
                cube([chamfer * 1.42, 0.01, chamfer * 1.42]);
        translate([0, outer_d + 0.1, back_h])
            rotate([0, -45, 0])
                cube([chamfer * 1.42, 0.01, chamfer * 1.42]);
    }

    // Right edge chamfer (follows tilt)
    translate([outer_w + 0.1, 0, 0])
    hull() {
        translate([0, -0.1, front_h])
            rotate([0, 45, 0])
                translate([-chamfer * 1.42, 0, 0])
                    cube([chamfer * 1.42, 0.01, chamfer * 1.42]);
        translate([0, outer_d + 0.1, back_h])
            rotate([0, 45, 0])
                translate([-chamfer * 1.42, 0, 0])
                    cube([chamfer * 1.42, 0.01, chamfer * 1.42]);
    }

    // Bottom edge chamfers (subtle, 0.5mm)
    bc = 0.5;
    // Front bottom
    translate([-0.1, -0.1, -0.1])
        rotate([-45, 0, 0])
            cube([outer_w + 0.2, bc * 1.42, bc * 1.42]);
    // Back bottom
    translate([-0.1, outer_d + 0.1, -0.1])
        rotate([-45, 0, 0])
            translate([0, -bc * 1.42, 0])
                cube([outer_w + 0.2, bc * 1.42, bc * 1.42]);
}

// Bottom rubber pad recesses (for anti-slip, no legs per spec)
pad_d   = 1.0;     // recess depth
pad_w   = 30.0;    // pad width
pad_h   = 10.0;    // pad length (front-back)
pad_inset = 15.0;  // inset from edges

module bottom_pad_recesses() {
    // Four pad recesses near the corners
    positions = [
        [pad_inset, pad_inset],                                    // front-left
        [outer_w - pad_inset - pad_w, pad_inset],                  // front-right
        [pad_inset, outer_d - pad_inset - pad_h],                  // back-left
        [outer_w - pad_inset - pad_w, outer_d - pad_inset - pad_h] // back-right
    ];

    for (pos = positions) {
        translate([pos[0], pos[1], -0.01])
            cube([pad_w, pad_h, pad_d + 0.01]);
    }
}

// =============================================================================
// SECTION 11: COMPLETE CASE WITH FINISHING
// =============================================================================

module case_tray_finished() {
    difference() {
        case_tray();
        // Bottom chamfers and pad recesses apply to tray only
        bc = 0.5;
        // Front bottom chamfer
        translate([-0.1, -0.1, -0.1])
            rotate([-45, 0, 0])
                cube([outer_w + 0.2, bc * 1.42, bc * 1.42]);
        // Back bottom chamfer
        translate([-0.1, outer_d + 0.1, -0.1])
            rotate([-45, 0, 0])
                translate([0, -bc * 1.42, 0])
                    cube([outer_w + 0.2, bc * 1.42, bc * 1.42]);
        bottom_pad_recesses();
    }
}

module case_overlay_finished() {
    // No CAD chamfers — the rounded corners make simple planar cuts
    // produce artifacts at the corners. Chamfers/edge breaks will be
    // applied during finishing (sanding/routing) on the physical piece.
    case_overlay();
}

// =============================================================================
// SECTION 12: VISUALIZATION GHOSTS
// =============================================================================

module plate_ghost() {
    color("silver", 0.25) {
        // Plate follows the tilt, positioned on gasket ledges
        translate([plate_ox, plate_oy, 0])
        hull() {
            // Front edge
            translate([0, 0, plate_z(plate_oy) - plate_t])
                cube([plate_w, 0.01, plate_t]);
            // Back edge
            translate([0, plate_d, plate_z(plate_oy + plate_d) - plate_t])
                cube([plate_w, 0.01, plate_t]);
        }
    }
}

module display_ghost() {
    dcx = p2c_x(disp_cx);
    dcy = p2c_y(disp_cy);
    overlay_bottom_z = top_z(dcy) - top_t;

    // Module body sits inside the overlay through-cut, bottom face resting on
    // the retainer (which is glued to the overlay underside). Glass top ends
    // up (top_t - glass_t) below the overlay top surface — a slightly
    // recessed display. With top_t=3 and glass_t=1.56 that's ~1.44 mm recess.
    module_bottom_z = overlay_bottom_z;
    module_top_z = overlay_bottom_z + disp_glass_t;

    color("black", 0.4)
    translate([dcx - disp_module_w/2, dcy - disp_module_h/2, module_bottom_z])
        cube([disp_module_w, disp_module_h, disp_glass_t]);

    // Active area highlight (visible through overlay cutout from above)
    color("cyan", 0.3)
    translate([dcx - disp_active_w/2, dcy - disp_active_h/2,
               module_top_z + 0.01])
        cube([disp_active_w, disp_active_h, 0.1]);
}

// =============================================================================
// SECTION 11: ASSEMBLY
// =============================================================================

module assembly() {
    if (SHOW_TRAY) {
        color("SaddleBrown", 0.85)
            case_tray_finished();
    }

    if (SHOW_OVERLAY) {
        color("SaddleBrown", 0.75)
        translate([0, 0, EXPLODE])
            case_overlay_finished();
    }

    if (SHOW_RETAINER) {
        // Retainer sits against the overlay underside, around the display hole.
        rcx = p2c_x(disp_cx);
        rcy = p2c_y(disp_cy);
        color("Goldenrod", 0.9)
        translate([rcx - disp_cut_w / 2,
                   rcy - disp_cut_h / 2,
                   top_z(rcy) - top_t - retainer_t + EXPLODE * 0.5])
            display_retainer();
    }

    if (SHOW_PLATE)
        translate([0, 0, EXPLODE * 0.5])
            plate_ghost();

    if (SHOW_DISPLAY)
        translate([0, 0, EXPLODE * 0.5])
            display_ghost();
}

// ─── RENDER ──────────────────────────────────────────────────────────────────
if (SHOW_SECTION) {
    difference() {
        assembly();
        // Section cut: remove front half for inspection
        translate([-1, -1, -1])
            cube([outer_w + 2, outer_d / 2, back_h + 2]);
    }
} else {
    assembly();
}

// ─── Dimension echo (for verification) ──────────────────────────────────────
echo("=== CASE DIMENSIONS ===");
echo(str("Outer: ", outer_w, " x ", outer_d, " x ", front_h, "-", back_h, " mm"));
echo(str("Wall: ", wall_t, " mm, Bottom: ", bottom_t, " mm, Top surface: ", top_t, " mm"));
echo(str("Tilt rise: ", tilt_rise, " mm over ", outer_d, " mm depth"));
echo(str("Overlay display through-cut: ", disp_cut_w, " x ", disp_cut_h, " mm (r=", disp_cut_r, ")"));
echo(str("Retainer outer: ", disp_cut_w, " x ", disp_cut_h, " mm, window: ", disp_win_w, " x ", disp_win_h, " mm, t=", retainer_t, " mm"));
echo(str("USB cutout: ", usb_cut_w, " x ", usb_cut_h, " mm at back wall"));
echo(str("Internal depth below plate: ", depth_below, " mm"));
echo(str("Plate recess below tray wall top: ", plate_recess, " mm"));
